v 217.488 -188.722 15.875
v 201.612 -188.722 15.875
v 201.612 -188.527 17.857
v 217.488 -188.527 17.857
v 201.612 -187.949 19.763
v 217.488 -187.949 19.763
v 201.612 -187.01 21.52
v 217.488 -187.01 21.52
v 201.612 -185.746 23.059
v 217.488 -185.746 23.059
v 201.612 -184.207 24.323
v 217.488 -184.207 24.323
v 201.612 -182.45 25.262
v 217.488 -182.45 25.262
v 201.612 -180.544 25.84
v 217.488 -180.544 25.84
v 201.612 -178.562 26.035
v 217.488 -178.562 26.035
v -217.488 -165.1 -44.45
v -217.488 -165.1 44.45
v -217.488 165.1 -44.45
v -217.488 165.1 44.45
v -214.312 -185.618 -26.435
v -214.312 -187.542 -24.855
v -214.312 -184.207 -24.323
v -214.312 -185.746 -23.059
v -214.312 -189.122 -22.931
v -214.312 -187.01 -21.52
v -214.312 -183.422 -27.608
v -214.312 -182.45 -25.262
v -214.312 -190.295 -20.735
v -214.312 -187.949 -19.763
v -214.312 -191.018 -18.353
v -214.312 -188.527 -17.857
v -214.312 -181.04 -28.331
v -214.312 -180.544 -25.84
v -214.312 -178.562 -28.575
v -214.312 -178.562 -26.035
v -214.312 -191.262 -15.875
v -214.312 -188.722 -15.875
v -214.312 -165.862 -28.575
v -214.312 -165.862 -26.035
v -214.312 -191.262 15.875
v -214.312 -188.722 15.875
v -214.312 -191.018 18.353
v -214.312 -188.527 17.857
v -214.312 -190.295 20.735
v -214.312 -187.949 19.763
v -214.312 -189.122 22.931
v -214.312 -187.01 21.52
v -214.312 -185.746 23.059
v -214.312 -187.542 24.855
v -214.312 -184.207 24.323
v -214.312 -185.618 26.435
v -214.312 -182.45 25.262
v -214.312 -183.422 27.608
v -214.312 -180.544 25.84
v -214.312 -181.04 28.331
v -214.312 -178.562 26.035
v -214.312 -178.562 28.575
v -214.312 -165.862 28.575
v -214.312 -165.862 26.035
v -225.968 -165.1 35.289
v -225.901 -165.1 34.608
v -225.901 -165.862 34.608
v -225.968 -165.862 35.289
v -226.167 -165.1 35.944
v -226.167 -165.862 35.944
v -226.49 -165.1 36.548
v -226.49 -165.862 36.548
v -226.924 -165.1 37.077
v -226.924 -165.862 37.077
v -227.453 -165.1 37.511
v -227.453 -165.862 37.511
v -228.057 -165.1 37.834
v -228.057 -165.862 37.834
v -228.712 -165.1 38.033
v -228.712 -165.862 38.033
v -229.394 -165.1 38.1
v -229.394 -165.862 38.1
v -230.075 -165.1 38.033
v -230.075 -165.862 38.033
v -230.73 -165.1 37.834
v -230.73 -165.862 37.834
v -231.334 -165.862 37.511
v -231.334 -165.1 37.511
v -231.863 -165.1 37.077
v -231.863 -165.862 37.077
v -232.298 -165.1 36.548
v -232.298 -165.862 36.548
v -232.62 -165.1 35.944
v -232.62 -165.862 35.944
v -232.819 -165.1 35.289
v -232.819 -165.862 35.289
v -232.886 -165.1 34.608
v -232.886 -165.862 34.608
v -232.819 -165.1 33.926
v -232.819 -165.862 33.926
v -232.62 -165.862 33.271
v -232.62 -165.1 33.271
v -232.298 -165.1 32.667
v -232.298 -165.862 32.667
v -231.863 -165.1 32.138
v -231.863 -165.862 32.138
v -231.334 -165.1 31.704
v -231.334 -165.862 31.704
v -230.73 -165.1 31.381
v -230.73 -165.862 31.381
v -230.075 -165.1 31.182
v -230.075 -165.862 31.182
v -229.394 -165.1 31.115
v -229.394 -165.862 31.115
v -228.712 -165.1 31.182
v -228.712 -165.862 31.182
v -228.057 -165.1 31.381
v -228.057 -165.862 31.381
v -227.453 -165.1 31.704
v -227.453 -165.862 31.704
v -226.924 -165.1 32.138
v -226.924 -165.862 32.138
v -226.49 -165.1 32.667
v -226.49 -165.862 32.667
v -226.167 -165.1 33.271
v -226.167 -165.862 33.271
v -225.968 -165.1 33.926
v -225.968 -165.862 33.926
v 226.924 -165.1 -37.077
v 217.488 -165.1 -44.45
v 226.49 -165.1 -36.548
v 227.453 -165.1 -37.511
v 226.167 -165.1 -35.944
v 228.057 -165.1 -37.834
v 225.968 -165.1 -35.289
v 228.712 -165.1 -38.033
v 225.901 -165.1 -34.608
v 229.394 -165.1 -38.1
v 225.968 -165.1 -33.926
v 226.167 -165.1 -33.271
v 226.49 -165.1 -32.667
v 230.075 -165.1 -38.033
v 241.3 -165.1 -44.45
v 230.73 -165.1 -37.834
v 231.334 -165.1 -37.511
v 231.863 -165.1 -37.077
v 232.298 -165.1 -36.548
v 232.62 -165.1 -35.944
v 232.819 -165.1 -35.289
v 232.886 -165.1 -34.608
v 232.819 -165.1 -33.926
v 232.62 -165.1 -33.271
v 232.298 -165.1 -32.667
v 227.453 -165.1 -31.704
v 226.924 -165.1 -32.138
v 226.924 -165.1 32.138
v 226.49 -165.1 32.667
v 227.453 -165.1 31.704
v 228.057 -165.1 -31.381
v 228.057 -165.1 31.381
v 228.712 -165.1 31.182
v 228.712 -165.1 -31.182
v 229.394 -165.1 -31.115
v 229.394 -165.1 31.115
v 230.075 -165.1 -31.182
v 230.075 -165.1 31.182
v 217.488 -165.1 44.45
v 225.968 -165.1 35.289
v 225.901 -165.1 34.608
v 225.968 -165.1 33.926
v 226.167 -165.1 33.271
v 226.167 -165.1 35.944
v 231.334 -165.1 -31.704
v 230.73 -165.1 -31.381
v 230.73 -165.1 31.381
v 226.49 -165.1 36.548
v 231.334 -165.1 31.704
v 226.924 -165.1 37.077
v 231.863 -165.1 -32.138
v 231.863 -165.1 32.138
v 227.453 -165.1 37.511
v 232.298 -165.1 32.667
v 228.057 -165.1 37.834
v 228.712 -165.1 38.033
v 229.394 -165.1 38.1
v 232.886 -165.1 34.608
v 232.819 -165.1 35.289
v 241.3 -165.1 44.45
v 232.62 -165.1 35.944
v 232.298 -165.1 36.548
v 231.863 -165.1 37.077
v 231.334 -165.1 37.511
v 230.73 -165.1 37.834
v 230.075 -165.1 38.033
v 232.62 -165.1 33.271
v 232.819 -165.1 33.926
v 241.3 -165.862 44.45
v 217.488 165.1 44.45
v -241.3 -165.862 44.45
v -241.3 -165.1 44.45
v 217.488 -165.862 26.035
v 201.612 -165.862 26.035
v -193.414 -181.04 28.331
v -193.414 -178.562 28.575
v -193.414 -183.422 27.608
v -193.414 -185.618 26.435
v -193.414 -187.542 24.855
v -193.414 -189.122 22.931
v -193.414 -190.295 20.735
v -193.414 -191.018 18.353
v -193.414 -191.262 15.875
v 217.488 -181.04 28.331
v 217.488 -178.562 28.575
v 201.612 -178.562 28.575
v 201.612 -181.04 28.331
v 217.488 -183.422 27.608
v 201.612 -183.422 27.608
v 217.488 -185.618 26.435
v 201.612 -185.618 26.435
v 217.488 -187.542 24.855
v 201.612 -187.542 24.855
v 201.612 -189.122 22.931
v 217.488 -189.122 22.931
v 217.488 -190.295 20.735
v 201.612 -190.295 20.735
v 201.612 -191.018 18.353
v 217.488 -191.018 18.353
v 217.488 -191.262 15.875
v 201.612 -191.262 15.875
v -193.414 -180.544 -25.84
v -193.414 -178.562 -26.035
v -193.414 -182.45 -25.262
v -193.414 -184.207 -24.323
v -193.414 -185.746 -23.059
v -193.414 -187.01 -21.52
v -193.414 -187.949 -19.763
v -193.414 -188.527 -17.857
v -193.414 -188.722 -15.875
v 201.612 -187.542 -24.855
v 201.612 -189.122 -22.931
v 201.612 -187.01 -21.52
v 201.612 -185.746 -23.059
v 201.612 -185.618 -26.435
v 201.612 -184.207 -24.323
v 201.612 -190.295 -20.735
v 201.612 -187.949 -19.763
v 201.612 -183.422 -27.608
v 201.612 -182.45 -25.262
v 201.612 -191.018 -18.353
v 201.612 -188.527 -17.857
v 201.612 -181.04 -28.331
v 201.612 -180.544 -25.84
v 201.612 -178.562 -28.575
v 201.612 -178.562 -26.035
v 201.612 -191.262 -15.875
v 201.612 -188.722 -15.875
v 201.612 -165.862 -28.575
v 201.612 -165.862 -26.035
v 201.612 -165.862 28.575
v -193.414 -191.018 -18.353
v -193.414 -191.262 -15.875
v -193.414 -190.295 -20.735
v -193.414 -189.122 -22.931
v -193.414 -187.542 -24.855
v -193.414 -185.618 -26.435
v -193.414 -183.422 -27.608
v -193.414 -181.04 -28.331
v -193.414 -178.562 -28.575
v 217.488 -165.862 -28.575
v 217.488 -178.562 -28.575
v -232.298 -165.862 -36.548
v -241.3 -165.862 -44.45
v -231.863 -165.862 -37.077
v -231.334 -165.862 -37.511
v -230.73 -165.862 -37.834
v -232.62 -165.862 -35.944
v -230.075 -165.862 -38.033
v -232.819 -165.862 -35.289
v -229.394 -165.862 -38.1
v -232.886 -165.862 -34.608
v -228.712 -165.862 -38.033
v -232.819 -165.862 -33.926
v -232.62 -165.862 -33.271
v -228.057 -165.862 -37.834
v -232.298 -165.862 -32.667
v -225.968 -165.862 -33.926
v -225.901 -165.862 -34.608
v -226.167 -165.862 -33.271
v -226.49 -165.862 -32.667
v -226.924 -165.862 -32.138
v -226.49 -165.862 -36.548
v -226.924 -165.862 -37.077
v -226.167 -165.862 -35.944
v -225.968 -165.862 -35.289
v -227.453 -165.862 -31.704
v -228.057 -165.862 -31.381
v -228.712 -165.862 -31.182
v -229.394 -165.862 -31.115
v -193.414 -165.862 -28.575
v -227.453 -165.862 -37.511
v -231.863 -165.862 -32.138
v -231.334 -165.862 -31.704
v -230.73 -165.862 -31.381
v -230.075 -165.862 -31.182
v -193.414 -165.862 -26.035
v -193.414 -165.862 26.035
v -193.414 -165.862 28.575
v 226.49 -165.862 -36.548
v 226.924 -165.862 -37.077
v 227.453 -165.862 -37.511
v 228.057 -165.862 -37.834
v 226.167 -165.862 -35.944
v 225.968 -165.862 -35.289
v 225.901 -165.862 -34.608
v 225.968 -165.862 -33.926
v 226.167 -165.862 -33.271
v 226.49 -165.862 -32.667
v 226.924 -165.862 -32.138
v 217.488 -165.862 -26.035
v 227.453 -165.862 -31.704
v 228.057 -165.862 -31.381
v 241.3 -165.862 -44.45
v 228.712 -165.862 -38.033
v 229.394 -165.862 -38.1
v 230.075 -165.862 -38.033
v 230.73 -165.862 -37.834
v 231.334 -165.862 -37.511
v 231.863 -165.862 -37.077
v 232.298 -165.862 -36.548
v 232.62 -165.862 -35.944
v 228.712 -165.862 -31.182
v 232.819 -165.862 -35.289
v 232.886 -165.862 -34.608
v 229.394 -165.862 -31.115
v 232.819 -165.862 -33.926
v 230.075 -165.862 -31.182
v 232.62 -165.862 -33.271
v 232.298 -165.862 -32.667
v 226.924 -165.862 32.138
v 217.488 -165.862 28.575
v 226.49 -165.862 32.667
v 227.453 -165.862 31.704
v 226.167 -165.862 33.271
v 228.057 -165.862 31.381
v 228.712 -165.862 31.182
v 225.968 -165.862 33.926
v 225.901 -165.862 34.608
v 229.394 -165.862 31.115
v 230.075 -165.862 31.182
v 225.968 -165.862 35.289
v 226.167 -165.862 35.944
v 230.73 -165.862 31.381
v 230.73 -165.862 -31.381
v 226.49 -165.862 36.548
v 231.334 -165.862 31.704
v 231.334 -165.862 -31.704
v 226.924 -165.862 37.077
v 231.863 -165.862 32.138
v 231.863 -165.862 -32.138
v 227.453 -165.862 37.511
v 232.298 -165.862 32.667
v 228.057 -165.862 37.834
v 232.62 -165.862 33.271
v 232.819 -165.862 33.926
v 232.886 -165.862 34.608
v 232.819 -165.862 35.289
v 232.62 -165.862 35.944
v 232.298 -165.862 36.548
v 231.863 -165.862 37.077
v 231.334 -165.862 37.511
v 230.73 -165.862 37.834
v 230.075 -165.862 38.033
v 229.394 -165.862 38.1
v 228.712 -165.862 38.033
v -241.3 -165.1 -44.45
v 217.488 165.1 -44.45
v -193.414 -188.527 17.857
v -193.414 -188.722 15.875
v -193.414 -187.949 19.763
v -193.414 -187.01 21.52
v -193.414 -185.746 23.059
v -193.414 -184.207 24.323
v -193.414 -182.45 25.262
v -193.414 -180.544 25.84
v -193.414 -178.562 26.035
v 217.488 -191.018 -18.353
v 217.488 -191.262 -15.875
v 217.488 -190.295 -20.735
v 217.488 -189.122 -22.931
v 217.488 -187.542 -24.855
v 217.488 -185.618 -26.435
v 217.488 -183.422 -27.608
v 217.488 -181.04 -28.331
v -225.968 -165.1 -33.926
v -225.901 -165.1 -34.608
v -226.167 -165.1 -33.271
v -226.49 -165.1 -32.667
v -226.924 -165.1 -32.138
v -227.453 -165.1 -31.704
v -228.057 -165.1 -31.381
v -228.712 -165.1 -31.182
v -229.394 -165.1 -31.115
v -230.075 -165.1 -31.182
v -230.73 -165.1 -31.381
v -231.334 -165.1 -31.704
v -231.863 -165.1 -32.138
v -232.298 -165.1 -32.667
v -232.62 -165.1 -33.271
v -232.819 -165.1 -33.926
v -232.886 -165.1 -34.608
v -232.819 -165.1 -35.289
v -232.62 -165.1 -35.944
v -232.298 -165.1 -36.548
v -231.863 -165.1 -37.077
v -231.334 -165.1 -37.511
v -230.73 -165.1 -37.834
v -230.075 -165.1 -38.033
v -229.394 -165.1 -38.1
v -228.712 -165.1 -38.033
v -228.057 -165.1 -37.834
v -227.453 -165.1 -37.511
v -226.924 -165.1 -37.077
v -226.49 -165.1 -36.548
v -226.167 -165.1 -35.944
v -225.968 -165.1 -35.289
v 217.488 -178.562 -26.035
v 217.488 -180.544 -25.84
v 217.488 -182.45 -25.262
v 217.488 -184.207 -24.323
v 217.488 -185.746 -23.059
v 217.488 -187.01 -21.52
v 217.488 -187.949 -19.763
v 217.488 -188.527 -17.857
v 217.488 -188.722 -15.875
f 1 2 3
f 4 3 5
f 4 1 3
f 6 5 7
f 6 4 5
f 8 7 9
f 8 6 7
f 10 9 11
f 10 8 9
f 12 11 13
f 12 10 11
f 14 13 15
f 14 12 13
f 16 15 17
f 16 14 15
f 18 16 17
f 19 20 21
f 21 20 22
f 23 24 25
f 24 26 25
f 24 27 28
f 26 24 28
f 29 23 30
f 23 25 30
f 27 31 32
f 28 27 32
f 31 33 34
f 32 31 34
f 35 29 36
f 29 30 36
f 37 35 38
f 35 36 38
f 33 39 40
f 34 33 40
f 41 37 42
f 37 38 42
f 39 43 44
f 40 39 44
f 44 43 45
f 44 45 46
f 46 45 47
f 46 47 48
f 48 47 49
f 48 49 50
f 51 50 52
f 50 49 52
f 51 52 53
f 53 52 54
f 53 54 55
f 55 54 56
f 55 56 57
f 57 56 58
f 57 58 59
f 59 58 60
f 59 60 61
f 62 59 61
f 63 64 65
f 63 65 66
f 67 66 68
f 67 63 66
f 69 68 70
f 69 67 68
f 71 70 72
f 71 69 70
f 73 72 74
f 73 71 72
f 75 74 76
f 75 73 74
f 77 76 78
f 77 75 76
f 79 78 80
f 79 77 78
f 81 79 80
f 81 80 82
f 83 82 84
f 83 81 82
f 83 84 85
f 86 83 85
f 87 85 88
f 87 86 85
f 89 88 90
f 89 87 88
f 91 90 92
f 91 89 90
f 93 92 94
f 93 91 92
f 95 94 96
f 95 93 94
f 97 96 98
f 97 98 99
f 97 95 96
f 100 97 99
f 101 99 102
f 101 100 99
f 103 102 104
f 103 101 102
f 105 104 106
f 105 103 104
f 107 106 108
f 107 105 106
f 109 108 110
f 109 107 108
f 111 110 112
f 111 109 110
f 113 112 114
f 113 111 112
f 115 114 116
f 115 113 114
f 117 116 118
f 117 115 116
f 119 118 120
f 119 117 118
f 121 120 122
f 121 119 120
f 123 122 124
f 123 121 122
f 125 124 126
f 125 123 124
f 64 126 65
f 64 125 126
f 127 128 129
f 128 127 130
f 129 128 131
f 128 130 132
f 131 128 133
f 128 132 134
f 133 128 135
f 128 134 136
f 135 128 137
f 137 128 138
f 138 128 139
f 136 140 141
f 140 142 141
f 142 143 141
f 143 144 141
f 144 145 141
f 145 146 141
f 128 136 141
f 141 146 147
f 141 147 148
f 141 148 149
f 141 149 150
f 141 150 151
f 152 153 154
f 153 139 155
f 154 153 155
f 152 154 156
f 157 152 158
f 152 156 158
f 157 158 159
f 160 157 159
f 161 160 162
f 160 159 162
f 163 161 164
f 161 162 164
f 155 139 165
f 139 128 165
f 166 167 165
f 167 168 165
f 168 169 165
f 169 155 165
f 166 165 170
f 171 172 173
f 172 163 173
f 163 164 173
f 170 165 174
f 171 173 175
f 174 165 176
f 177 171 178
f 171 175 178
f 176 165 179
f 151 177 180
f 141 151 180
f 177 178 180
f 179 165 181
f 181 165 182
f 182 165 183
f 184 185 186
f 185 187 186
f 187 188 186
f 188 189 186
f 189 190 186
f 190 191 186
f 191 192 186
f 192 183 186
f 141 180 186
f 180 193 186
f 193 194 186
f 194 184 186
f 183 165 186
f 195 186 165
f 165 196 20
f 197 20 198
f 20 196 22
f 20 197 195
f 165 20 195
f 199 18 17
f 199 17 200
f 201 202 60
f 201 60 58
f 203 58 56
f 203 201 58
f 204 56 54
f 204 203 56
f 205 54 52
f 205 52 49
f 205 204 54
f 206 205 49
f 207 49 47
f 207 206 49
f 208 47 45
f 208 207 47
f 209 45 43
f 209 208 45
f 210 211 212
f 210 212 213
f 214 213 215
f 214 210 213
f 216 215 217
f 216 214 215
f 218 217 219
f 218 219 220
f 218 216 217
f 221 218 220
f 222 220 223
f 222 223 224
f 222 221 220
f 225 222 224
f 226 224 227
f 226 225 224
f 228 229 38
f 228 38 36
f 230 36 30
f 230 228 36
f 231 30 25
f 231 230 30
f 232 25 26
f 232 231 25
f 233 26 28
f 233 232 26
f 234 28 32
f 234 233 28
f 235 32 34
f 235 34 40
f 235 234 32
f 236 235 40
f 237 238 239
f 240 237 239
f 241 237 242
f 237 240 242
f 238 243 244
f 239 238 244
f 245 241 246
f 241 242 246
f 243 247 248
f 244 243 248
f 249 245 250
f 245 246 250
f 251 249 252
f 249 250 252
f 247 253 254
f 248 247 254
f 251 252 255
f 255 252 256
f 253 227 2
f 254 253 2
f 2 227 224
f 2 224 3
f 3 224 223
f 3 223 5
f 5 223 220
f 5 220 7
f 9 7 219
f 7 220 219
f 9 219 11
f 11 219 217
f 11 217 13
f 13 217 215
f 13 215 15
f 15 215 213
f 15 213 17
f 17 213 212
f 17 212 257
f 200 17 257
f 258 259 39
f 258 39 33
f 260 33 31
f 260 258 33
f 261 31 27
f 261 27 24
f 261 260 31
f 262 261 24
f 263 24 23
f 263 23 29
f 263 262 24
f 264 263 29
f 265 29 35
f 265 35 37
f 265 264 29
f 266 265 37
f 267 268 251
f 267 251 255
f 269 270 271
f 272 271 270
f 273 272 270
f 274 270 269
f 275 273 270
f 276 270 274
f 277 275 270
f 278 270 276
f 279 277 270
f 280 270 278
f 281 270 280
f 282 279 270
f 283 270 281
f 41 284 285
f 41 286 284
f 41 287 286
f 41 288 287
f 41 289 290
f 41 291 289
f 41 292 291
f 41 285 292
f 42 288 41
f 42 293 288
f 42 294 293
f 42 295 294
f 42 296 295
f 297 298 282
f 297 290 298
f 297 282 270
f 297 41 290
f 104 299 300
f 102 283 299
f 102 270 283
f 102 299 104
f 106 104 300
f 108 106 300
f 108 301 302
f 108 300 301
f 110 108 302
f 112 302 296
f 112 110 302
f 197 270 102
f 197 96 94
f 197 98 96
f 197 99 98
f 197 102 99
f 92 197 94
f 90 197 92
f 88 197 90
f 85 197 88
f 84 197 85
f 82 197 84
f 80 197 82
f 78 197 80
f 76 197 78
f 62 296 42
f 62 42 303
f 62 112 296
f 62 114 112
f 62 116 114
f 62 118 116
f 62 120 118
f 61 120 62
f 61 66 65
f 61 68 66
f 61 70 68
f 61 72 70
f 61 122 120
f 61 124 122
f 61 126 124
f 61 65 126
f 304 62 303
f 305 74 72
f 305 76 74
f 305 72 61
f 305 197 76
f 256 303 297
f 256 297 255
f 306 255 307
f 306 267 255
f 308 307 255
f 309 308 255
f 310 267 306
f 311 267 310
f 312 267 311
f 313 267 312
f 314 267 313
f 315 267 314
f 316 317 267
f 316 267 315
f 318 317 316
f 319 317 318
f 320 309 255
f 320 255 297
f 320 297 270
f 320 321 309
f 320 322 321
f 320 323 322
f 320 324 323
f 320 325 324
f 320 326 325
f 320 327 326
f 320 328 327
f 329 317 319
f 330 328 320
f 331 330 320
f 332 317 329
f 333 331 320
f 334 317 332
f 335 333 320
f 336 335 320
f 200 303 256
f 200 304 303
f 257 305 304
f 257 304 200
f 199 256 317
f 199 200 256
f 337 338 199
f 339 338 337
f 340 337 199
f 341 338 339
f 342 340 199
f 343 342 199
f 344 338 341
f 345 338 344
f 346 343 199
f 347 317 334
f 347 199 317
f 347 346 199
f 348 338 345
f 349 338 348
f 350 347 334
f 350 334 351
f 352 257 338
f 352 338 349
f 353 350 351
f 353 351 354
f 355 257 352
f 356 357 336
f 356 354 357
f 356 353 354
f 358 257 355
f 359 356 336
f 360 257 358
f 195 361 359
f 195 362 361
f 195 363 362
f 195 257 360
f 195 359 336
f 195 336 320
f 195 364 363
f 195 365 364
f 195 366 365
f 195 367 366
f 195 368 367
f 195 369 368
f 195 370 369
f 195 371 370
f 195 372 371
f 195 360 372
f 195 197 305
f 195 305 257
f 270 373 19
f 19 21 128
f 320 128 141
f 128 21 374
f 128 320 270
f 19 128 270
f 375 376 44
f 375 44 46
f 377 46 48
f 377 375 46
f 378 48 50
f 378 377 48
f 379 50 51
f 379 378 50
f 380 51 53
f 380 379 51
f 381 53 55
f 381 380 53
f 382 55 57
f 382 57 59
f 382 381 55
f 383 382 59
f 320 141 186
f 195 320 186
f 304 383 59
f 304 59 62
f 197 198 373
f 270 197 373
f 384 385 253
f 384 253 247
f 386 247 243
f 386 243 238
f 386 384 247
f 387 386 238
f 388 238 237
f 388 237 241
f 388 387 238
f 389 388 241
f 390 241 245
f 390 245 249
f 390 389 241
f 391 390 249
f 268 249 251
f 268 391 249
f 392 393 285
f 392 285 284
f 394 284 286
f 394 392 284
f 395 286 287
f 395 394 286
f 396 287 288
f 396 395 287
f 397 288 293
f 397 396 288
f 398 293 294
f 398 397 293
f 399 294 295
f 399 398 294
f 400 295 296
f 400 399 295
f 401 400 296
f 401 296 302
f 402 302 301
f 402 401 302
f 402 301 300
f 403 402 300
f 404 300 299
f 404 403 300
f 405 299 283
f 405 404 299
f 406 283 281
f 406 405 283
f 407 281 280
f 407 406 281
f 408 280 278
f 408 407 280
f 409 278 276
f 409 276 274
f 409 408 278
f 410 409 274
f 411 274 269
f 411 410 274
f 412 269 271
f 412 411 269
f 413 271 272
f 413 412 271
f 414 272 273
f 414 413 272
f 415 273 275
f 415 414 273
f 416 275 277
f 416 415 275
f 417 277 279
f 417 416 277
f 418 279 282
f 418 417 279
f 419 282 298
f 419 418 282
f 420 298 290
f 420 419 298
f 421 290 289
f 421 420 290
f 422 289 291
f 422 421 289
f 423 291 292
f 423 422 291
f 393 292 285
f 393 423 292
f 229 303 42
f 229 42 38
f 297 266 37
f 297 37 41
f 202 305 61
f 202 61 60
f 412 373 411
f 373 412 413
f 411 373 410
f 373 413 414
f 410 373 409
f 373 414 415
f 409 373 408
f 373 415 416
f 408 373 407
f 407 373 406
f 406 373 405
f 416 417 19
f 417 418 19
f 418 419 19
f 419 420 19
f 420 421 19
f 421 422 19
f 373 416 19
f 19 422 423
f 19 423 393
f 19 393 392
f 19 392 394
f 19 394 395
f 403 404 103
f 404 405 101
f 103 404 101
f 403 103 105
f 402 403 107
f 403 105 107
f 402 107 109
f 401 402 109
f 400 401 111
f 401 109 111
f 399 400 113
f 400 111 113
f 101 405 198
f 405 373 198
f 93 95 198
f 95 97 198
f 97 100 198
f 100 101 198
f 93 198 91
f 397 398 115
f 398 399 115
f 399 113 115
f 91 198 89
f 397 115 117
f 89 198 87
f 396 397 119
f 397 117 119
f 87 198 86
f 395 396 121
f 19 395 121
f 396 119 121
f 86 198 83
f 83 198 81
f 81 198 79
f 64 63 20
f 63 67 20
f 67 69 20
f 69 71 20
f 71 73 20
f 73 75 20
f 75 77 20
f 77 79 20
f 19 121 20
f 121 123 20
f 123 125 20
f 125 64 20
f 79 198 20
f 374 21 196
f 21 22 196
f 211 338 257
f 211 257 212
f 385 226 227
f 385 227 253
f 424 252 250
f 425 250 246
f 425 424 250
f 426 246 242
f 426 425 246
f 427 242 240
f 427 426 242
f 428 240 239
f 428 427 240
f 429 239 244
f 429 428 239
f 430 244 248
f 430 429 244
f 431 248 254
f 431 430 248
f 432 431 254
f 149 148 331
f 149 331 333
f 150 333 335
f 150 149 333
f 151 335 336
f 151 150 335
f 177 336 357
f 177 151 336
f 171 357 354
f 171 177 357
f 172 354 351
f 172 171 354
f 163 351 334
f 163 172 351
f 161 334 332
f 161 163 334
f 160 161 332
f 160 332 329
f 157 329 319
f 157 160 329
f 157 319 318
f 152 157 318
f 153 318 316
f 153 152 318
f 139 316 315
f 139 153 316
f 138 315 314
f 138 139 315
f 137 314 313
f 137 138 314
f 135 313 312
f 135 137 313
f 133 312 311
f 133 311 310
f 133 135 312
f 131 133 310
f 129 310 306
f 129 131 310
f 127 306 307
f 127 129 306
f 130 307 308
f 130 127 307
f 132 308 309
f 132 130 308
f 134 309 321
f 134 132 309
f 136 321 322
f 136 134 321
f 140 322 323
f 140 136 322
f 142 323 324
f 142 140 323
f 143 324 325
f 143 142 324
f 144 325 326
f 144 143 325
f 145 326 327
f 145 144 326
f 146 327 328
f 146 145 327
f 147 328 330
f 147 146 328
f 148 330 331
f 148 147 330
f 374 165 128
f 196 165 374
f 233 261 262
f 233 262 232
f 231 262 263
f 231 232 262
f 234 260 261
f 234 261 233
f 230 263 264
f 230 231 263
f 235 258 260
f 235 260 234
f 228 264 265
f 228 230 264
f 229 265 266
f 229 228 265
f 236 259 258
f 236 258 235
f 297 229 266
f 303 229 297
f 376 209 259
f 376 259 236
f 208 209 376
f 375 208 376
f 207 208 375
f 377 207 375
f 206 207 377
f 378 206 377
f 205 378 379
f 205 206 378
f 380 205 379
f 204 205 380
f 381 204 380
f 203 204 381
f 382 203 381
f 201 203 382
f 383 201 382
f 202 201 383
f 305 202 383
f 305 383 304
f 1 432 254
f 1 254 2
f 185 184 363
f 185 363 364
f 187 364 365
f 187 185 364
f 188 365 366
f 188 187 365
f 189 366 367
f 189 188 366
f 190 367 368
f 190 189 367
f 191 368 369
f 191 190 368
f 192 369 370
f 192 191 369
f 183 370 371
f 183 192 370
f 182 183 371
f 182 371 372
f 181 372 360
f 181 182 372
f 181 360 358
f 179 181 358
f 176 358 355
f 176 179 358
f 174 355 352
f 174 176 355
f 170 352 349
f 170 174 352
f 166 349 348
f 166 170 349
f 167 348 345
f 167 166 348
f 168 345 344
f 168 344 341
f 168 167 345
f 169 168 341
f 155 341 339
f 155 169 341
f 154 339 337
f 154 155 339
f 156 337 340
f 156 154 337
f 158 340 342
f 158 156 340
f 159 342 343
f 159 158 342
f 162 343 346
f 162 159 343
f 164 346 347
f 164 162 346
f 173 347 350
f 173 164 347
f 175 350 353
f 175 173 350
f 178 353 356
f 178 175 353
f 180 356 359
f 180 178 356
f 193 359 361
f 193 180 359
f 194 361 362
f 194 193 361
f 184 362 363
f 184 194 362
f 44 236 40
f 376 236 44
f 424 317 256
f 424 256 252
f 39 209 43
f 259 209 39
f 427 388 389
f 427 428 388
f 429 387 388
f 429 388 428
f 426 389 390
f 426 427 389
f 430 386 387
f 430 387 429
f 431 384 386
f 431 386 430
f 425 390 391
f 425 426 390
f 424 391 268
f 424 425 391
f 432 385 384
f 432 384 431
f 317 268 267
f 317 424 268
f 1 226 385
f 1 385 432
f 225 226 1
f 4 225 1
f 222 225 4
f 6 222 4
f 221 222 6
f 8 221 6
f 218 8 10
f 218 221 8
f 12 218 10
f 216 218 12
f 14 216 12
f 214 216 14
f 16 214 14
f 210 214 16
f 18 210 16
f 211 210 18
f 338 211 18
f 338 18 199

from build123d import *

# Parameters (mm, degrees)
F0_W     = 434.975
F0_H     = 330.2
F1_DEPTH = 44.45
F2_R     = 3.4925
F3_DEPTH = 0.762
F5_DEPTH = 431.8
F6_W     = 395.026488
F6_H     = 25.4
F7_DEPTH = 88.901


with BuildPart() as f1:
    # F0 (on Top) → F1 (new body, symmetric)
    with BuildSketch(Plane.XY):
        Rectangle(F0_W, F0_H)
    extrude(amount=F1_DEPTH, both=True)

    # F2 (on face) → F3 (join)
    with BuildSketch(Plane.XZ.offset(165.1)):
        Polygon((-241.3, 44.45), (-241.3, -44.45), (-217.4875, -44.45), (241.3, -44.45), (241.3, 44.45), align=None)
        with Locations((-229.39375, -34.6075)):
            Circle(F2_R, mode=Mode.SUBTRACT)
        with Locations((229.39375, -34.6075)):
            Circle(F2_R, mode=Mode.SUBTRACT)
        with Locations((-229.39375, 34.6075)):
            Circle(F2_R, mode=Mode.SUBTRACT)
        with Locations((229.39375, 34.6075)):
            Circle(F2_R, mode=Mode.SUBTRACT)
    extrude(amount=F3_DEPTH)

    # F4 (on face) → F5 (join)
    with BuildSketch(Plane.YZ.offset(217.4875)):
        with BuildLine():
            Line((-191.262, 15.875), (-191.262, 0))
            Line((-191.262, 0), (-191.262, -15.875))
            ThreePointArc((-191.262, -15.875), (-187.542256, -24.855256), (-178.562, -28.575))
            Line((-178.562, -28.575), (-165.862, -28.575))
            Line((-165.862, -28.575), (-165.862, -26.035))
            Line((-165.862, -26.035), (-178.562, -26.035))
            ThreePointArc((-178.562, -26.035), (-185.746205, -23.059205), (-188.722, -15.875))
            Line((-188.722, -15.875), (-188.722, 0))
            Line((-188.722, 0), (-188.722, 15.875))
            ThreePointArc((-188.722, 15.875), (-185.746205, 23.059205), (-178.562, 26.035))
            Line((-178.562, 26.035), (-165.862, 26.035))
            Line((-165.862, 26.035), (-165.862, 28.575))
            Line((-165.862, 28.575), (-178.562, 28.575))
            ThreePointArc((-178.562, 28.575), (-187.542256, 24.855256), (-191.262, 15.875))
        make_face()
    extrude(amount=-F5_DEPTH)

    # F6 (on face) → F7 (cut, through all)
    with BuildSketch(Plane.XY.offset(44.45)):
        with Locations((4.099256, -178.562)):
            Rectangle(F6_W, F6_H)
    extrude(amount=-F7_DEPTH, mode=Mode.SUBTRACT)


solid = f1.part
